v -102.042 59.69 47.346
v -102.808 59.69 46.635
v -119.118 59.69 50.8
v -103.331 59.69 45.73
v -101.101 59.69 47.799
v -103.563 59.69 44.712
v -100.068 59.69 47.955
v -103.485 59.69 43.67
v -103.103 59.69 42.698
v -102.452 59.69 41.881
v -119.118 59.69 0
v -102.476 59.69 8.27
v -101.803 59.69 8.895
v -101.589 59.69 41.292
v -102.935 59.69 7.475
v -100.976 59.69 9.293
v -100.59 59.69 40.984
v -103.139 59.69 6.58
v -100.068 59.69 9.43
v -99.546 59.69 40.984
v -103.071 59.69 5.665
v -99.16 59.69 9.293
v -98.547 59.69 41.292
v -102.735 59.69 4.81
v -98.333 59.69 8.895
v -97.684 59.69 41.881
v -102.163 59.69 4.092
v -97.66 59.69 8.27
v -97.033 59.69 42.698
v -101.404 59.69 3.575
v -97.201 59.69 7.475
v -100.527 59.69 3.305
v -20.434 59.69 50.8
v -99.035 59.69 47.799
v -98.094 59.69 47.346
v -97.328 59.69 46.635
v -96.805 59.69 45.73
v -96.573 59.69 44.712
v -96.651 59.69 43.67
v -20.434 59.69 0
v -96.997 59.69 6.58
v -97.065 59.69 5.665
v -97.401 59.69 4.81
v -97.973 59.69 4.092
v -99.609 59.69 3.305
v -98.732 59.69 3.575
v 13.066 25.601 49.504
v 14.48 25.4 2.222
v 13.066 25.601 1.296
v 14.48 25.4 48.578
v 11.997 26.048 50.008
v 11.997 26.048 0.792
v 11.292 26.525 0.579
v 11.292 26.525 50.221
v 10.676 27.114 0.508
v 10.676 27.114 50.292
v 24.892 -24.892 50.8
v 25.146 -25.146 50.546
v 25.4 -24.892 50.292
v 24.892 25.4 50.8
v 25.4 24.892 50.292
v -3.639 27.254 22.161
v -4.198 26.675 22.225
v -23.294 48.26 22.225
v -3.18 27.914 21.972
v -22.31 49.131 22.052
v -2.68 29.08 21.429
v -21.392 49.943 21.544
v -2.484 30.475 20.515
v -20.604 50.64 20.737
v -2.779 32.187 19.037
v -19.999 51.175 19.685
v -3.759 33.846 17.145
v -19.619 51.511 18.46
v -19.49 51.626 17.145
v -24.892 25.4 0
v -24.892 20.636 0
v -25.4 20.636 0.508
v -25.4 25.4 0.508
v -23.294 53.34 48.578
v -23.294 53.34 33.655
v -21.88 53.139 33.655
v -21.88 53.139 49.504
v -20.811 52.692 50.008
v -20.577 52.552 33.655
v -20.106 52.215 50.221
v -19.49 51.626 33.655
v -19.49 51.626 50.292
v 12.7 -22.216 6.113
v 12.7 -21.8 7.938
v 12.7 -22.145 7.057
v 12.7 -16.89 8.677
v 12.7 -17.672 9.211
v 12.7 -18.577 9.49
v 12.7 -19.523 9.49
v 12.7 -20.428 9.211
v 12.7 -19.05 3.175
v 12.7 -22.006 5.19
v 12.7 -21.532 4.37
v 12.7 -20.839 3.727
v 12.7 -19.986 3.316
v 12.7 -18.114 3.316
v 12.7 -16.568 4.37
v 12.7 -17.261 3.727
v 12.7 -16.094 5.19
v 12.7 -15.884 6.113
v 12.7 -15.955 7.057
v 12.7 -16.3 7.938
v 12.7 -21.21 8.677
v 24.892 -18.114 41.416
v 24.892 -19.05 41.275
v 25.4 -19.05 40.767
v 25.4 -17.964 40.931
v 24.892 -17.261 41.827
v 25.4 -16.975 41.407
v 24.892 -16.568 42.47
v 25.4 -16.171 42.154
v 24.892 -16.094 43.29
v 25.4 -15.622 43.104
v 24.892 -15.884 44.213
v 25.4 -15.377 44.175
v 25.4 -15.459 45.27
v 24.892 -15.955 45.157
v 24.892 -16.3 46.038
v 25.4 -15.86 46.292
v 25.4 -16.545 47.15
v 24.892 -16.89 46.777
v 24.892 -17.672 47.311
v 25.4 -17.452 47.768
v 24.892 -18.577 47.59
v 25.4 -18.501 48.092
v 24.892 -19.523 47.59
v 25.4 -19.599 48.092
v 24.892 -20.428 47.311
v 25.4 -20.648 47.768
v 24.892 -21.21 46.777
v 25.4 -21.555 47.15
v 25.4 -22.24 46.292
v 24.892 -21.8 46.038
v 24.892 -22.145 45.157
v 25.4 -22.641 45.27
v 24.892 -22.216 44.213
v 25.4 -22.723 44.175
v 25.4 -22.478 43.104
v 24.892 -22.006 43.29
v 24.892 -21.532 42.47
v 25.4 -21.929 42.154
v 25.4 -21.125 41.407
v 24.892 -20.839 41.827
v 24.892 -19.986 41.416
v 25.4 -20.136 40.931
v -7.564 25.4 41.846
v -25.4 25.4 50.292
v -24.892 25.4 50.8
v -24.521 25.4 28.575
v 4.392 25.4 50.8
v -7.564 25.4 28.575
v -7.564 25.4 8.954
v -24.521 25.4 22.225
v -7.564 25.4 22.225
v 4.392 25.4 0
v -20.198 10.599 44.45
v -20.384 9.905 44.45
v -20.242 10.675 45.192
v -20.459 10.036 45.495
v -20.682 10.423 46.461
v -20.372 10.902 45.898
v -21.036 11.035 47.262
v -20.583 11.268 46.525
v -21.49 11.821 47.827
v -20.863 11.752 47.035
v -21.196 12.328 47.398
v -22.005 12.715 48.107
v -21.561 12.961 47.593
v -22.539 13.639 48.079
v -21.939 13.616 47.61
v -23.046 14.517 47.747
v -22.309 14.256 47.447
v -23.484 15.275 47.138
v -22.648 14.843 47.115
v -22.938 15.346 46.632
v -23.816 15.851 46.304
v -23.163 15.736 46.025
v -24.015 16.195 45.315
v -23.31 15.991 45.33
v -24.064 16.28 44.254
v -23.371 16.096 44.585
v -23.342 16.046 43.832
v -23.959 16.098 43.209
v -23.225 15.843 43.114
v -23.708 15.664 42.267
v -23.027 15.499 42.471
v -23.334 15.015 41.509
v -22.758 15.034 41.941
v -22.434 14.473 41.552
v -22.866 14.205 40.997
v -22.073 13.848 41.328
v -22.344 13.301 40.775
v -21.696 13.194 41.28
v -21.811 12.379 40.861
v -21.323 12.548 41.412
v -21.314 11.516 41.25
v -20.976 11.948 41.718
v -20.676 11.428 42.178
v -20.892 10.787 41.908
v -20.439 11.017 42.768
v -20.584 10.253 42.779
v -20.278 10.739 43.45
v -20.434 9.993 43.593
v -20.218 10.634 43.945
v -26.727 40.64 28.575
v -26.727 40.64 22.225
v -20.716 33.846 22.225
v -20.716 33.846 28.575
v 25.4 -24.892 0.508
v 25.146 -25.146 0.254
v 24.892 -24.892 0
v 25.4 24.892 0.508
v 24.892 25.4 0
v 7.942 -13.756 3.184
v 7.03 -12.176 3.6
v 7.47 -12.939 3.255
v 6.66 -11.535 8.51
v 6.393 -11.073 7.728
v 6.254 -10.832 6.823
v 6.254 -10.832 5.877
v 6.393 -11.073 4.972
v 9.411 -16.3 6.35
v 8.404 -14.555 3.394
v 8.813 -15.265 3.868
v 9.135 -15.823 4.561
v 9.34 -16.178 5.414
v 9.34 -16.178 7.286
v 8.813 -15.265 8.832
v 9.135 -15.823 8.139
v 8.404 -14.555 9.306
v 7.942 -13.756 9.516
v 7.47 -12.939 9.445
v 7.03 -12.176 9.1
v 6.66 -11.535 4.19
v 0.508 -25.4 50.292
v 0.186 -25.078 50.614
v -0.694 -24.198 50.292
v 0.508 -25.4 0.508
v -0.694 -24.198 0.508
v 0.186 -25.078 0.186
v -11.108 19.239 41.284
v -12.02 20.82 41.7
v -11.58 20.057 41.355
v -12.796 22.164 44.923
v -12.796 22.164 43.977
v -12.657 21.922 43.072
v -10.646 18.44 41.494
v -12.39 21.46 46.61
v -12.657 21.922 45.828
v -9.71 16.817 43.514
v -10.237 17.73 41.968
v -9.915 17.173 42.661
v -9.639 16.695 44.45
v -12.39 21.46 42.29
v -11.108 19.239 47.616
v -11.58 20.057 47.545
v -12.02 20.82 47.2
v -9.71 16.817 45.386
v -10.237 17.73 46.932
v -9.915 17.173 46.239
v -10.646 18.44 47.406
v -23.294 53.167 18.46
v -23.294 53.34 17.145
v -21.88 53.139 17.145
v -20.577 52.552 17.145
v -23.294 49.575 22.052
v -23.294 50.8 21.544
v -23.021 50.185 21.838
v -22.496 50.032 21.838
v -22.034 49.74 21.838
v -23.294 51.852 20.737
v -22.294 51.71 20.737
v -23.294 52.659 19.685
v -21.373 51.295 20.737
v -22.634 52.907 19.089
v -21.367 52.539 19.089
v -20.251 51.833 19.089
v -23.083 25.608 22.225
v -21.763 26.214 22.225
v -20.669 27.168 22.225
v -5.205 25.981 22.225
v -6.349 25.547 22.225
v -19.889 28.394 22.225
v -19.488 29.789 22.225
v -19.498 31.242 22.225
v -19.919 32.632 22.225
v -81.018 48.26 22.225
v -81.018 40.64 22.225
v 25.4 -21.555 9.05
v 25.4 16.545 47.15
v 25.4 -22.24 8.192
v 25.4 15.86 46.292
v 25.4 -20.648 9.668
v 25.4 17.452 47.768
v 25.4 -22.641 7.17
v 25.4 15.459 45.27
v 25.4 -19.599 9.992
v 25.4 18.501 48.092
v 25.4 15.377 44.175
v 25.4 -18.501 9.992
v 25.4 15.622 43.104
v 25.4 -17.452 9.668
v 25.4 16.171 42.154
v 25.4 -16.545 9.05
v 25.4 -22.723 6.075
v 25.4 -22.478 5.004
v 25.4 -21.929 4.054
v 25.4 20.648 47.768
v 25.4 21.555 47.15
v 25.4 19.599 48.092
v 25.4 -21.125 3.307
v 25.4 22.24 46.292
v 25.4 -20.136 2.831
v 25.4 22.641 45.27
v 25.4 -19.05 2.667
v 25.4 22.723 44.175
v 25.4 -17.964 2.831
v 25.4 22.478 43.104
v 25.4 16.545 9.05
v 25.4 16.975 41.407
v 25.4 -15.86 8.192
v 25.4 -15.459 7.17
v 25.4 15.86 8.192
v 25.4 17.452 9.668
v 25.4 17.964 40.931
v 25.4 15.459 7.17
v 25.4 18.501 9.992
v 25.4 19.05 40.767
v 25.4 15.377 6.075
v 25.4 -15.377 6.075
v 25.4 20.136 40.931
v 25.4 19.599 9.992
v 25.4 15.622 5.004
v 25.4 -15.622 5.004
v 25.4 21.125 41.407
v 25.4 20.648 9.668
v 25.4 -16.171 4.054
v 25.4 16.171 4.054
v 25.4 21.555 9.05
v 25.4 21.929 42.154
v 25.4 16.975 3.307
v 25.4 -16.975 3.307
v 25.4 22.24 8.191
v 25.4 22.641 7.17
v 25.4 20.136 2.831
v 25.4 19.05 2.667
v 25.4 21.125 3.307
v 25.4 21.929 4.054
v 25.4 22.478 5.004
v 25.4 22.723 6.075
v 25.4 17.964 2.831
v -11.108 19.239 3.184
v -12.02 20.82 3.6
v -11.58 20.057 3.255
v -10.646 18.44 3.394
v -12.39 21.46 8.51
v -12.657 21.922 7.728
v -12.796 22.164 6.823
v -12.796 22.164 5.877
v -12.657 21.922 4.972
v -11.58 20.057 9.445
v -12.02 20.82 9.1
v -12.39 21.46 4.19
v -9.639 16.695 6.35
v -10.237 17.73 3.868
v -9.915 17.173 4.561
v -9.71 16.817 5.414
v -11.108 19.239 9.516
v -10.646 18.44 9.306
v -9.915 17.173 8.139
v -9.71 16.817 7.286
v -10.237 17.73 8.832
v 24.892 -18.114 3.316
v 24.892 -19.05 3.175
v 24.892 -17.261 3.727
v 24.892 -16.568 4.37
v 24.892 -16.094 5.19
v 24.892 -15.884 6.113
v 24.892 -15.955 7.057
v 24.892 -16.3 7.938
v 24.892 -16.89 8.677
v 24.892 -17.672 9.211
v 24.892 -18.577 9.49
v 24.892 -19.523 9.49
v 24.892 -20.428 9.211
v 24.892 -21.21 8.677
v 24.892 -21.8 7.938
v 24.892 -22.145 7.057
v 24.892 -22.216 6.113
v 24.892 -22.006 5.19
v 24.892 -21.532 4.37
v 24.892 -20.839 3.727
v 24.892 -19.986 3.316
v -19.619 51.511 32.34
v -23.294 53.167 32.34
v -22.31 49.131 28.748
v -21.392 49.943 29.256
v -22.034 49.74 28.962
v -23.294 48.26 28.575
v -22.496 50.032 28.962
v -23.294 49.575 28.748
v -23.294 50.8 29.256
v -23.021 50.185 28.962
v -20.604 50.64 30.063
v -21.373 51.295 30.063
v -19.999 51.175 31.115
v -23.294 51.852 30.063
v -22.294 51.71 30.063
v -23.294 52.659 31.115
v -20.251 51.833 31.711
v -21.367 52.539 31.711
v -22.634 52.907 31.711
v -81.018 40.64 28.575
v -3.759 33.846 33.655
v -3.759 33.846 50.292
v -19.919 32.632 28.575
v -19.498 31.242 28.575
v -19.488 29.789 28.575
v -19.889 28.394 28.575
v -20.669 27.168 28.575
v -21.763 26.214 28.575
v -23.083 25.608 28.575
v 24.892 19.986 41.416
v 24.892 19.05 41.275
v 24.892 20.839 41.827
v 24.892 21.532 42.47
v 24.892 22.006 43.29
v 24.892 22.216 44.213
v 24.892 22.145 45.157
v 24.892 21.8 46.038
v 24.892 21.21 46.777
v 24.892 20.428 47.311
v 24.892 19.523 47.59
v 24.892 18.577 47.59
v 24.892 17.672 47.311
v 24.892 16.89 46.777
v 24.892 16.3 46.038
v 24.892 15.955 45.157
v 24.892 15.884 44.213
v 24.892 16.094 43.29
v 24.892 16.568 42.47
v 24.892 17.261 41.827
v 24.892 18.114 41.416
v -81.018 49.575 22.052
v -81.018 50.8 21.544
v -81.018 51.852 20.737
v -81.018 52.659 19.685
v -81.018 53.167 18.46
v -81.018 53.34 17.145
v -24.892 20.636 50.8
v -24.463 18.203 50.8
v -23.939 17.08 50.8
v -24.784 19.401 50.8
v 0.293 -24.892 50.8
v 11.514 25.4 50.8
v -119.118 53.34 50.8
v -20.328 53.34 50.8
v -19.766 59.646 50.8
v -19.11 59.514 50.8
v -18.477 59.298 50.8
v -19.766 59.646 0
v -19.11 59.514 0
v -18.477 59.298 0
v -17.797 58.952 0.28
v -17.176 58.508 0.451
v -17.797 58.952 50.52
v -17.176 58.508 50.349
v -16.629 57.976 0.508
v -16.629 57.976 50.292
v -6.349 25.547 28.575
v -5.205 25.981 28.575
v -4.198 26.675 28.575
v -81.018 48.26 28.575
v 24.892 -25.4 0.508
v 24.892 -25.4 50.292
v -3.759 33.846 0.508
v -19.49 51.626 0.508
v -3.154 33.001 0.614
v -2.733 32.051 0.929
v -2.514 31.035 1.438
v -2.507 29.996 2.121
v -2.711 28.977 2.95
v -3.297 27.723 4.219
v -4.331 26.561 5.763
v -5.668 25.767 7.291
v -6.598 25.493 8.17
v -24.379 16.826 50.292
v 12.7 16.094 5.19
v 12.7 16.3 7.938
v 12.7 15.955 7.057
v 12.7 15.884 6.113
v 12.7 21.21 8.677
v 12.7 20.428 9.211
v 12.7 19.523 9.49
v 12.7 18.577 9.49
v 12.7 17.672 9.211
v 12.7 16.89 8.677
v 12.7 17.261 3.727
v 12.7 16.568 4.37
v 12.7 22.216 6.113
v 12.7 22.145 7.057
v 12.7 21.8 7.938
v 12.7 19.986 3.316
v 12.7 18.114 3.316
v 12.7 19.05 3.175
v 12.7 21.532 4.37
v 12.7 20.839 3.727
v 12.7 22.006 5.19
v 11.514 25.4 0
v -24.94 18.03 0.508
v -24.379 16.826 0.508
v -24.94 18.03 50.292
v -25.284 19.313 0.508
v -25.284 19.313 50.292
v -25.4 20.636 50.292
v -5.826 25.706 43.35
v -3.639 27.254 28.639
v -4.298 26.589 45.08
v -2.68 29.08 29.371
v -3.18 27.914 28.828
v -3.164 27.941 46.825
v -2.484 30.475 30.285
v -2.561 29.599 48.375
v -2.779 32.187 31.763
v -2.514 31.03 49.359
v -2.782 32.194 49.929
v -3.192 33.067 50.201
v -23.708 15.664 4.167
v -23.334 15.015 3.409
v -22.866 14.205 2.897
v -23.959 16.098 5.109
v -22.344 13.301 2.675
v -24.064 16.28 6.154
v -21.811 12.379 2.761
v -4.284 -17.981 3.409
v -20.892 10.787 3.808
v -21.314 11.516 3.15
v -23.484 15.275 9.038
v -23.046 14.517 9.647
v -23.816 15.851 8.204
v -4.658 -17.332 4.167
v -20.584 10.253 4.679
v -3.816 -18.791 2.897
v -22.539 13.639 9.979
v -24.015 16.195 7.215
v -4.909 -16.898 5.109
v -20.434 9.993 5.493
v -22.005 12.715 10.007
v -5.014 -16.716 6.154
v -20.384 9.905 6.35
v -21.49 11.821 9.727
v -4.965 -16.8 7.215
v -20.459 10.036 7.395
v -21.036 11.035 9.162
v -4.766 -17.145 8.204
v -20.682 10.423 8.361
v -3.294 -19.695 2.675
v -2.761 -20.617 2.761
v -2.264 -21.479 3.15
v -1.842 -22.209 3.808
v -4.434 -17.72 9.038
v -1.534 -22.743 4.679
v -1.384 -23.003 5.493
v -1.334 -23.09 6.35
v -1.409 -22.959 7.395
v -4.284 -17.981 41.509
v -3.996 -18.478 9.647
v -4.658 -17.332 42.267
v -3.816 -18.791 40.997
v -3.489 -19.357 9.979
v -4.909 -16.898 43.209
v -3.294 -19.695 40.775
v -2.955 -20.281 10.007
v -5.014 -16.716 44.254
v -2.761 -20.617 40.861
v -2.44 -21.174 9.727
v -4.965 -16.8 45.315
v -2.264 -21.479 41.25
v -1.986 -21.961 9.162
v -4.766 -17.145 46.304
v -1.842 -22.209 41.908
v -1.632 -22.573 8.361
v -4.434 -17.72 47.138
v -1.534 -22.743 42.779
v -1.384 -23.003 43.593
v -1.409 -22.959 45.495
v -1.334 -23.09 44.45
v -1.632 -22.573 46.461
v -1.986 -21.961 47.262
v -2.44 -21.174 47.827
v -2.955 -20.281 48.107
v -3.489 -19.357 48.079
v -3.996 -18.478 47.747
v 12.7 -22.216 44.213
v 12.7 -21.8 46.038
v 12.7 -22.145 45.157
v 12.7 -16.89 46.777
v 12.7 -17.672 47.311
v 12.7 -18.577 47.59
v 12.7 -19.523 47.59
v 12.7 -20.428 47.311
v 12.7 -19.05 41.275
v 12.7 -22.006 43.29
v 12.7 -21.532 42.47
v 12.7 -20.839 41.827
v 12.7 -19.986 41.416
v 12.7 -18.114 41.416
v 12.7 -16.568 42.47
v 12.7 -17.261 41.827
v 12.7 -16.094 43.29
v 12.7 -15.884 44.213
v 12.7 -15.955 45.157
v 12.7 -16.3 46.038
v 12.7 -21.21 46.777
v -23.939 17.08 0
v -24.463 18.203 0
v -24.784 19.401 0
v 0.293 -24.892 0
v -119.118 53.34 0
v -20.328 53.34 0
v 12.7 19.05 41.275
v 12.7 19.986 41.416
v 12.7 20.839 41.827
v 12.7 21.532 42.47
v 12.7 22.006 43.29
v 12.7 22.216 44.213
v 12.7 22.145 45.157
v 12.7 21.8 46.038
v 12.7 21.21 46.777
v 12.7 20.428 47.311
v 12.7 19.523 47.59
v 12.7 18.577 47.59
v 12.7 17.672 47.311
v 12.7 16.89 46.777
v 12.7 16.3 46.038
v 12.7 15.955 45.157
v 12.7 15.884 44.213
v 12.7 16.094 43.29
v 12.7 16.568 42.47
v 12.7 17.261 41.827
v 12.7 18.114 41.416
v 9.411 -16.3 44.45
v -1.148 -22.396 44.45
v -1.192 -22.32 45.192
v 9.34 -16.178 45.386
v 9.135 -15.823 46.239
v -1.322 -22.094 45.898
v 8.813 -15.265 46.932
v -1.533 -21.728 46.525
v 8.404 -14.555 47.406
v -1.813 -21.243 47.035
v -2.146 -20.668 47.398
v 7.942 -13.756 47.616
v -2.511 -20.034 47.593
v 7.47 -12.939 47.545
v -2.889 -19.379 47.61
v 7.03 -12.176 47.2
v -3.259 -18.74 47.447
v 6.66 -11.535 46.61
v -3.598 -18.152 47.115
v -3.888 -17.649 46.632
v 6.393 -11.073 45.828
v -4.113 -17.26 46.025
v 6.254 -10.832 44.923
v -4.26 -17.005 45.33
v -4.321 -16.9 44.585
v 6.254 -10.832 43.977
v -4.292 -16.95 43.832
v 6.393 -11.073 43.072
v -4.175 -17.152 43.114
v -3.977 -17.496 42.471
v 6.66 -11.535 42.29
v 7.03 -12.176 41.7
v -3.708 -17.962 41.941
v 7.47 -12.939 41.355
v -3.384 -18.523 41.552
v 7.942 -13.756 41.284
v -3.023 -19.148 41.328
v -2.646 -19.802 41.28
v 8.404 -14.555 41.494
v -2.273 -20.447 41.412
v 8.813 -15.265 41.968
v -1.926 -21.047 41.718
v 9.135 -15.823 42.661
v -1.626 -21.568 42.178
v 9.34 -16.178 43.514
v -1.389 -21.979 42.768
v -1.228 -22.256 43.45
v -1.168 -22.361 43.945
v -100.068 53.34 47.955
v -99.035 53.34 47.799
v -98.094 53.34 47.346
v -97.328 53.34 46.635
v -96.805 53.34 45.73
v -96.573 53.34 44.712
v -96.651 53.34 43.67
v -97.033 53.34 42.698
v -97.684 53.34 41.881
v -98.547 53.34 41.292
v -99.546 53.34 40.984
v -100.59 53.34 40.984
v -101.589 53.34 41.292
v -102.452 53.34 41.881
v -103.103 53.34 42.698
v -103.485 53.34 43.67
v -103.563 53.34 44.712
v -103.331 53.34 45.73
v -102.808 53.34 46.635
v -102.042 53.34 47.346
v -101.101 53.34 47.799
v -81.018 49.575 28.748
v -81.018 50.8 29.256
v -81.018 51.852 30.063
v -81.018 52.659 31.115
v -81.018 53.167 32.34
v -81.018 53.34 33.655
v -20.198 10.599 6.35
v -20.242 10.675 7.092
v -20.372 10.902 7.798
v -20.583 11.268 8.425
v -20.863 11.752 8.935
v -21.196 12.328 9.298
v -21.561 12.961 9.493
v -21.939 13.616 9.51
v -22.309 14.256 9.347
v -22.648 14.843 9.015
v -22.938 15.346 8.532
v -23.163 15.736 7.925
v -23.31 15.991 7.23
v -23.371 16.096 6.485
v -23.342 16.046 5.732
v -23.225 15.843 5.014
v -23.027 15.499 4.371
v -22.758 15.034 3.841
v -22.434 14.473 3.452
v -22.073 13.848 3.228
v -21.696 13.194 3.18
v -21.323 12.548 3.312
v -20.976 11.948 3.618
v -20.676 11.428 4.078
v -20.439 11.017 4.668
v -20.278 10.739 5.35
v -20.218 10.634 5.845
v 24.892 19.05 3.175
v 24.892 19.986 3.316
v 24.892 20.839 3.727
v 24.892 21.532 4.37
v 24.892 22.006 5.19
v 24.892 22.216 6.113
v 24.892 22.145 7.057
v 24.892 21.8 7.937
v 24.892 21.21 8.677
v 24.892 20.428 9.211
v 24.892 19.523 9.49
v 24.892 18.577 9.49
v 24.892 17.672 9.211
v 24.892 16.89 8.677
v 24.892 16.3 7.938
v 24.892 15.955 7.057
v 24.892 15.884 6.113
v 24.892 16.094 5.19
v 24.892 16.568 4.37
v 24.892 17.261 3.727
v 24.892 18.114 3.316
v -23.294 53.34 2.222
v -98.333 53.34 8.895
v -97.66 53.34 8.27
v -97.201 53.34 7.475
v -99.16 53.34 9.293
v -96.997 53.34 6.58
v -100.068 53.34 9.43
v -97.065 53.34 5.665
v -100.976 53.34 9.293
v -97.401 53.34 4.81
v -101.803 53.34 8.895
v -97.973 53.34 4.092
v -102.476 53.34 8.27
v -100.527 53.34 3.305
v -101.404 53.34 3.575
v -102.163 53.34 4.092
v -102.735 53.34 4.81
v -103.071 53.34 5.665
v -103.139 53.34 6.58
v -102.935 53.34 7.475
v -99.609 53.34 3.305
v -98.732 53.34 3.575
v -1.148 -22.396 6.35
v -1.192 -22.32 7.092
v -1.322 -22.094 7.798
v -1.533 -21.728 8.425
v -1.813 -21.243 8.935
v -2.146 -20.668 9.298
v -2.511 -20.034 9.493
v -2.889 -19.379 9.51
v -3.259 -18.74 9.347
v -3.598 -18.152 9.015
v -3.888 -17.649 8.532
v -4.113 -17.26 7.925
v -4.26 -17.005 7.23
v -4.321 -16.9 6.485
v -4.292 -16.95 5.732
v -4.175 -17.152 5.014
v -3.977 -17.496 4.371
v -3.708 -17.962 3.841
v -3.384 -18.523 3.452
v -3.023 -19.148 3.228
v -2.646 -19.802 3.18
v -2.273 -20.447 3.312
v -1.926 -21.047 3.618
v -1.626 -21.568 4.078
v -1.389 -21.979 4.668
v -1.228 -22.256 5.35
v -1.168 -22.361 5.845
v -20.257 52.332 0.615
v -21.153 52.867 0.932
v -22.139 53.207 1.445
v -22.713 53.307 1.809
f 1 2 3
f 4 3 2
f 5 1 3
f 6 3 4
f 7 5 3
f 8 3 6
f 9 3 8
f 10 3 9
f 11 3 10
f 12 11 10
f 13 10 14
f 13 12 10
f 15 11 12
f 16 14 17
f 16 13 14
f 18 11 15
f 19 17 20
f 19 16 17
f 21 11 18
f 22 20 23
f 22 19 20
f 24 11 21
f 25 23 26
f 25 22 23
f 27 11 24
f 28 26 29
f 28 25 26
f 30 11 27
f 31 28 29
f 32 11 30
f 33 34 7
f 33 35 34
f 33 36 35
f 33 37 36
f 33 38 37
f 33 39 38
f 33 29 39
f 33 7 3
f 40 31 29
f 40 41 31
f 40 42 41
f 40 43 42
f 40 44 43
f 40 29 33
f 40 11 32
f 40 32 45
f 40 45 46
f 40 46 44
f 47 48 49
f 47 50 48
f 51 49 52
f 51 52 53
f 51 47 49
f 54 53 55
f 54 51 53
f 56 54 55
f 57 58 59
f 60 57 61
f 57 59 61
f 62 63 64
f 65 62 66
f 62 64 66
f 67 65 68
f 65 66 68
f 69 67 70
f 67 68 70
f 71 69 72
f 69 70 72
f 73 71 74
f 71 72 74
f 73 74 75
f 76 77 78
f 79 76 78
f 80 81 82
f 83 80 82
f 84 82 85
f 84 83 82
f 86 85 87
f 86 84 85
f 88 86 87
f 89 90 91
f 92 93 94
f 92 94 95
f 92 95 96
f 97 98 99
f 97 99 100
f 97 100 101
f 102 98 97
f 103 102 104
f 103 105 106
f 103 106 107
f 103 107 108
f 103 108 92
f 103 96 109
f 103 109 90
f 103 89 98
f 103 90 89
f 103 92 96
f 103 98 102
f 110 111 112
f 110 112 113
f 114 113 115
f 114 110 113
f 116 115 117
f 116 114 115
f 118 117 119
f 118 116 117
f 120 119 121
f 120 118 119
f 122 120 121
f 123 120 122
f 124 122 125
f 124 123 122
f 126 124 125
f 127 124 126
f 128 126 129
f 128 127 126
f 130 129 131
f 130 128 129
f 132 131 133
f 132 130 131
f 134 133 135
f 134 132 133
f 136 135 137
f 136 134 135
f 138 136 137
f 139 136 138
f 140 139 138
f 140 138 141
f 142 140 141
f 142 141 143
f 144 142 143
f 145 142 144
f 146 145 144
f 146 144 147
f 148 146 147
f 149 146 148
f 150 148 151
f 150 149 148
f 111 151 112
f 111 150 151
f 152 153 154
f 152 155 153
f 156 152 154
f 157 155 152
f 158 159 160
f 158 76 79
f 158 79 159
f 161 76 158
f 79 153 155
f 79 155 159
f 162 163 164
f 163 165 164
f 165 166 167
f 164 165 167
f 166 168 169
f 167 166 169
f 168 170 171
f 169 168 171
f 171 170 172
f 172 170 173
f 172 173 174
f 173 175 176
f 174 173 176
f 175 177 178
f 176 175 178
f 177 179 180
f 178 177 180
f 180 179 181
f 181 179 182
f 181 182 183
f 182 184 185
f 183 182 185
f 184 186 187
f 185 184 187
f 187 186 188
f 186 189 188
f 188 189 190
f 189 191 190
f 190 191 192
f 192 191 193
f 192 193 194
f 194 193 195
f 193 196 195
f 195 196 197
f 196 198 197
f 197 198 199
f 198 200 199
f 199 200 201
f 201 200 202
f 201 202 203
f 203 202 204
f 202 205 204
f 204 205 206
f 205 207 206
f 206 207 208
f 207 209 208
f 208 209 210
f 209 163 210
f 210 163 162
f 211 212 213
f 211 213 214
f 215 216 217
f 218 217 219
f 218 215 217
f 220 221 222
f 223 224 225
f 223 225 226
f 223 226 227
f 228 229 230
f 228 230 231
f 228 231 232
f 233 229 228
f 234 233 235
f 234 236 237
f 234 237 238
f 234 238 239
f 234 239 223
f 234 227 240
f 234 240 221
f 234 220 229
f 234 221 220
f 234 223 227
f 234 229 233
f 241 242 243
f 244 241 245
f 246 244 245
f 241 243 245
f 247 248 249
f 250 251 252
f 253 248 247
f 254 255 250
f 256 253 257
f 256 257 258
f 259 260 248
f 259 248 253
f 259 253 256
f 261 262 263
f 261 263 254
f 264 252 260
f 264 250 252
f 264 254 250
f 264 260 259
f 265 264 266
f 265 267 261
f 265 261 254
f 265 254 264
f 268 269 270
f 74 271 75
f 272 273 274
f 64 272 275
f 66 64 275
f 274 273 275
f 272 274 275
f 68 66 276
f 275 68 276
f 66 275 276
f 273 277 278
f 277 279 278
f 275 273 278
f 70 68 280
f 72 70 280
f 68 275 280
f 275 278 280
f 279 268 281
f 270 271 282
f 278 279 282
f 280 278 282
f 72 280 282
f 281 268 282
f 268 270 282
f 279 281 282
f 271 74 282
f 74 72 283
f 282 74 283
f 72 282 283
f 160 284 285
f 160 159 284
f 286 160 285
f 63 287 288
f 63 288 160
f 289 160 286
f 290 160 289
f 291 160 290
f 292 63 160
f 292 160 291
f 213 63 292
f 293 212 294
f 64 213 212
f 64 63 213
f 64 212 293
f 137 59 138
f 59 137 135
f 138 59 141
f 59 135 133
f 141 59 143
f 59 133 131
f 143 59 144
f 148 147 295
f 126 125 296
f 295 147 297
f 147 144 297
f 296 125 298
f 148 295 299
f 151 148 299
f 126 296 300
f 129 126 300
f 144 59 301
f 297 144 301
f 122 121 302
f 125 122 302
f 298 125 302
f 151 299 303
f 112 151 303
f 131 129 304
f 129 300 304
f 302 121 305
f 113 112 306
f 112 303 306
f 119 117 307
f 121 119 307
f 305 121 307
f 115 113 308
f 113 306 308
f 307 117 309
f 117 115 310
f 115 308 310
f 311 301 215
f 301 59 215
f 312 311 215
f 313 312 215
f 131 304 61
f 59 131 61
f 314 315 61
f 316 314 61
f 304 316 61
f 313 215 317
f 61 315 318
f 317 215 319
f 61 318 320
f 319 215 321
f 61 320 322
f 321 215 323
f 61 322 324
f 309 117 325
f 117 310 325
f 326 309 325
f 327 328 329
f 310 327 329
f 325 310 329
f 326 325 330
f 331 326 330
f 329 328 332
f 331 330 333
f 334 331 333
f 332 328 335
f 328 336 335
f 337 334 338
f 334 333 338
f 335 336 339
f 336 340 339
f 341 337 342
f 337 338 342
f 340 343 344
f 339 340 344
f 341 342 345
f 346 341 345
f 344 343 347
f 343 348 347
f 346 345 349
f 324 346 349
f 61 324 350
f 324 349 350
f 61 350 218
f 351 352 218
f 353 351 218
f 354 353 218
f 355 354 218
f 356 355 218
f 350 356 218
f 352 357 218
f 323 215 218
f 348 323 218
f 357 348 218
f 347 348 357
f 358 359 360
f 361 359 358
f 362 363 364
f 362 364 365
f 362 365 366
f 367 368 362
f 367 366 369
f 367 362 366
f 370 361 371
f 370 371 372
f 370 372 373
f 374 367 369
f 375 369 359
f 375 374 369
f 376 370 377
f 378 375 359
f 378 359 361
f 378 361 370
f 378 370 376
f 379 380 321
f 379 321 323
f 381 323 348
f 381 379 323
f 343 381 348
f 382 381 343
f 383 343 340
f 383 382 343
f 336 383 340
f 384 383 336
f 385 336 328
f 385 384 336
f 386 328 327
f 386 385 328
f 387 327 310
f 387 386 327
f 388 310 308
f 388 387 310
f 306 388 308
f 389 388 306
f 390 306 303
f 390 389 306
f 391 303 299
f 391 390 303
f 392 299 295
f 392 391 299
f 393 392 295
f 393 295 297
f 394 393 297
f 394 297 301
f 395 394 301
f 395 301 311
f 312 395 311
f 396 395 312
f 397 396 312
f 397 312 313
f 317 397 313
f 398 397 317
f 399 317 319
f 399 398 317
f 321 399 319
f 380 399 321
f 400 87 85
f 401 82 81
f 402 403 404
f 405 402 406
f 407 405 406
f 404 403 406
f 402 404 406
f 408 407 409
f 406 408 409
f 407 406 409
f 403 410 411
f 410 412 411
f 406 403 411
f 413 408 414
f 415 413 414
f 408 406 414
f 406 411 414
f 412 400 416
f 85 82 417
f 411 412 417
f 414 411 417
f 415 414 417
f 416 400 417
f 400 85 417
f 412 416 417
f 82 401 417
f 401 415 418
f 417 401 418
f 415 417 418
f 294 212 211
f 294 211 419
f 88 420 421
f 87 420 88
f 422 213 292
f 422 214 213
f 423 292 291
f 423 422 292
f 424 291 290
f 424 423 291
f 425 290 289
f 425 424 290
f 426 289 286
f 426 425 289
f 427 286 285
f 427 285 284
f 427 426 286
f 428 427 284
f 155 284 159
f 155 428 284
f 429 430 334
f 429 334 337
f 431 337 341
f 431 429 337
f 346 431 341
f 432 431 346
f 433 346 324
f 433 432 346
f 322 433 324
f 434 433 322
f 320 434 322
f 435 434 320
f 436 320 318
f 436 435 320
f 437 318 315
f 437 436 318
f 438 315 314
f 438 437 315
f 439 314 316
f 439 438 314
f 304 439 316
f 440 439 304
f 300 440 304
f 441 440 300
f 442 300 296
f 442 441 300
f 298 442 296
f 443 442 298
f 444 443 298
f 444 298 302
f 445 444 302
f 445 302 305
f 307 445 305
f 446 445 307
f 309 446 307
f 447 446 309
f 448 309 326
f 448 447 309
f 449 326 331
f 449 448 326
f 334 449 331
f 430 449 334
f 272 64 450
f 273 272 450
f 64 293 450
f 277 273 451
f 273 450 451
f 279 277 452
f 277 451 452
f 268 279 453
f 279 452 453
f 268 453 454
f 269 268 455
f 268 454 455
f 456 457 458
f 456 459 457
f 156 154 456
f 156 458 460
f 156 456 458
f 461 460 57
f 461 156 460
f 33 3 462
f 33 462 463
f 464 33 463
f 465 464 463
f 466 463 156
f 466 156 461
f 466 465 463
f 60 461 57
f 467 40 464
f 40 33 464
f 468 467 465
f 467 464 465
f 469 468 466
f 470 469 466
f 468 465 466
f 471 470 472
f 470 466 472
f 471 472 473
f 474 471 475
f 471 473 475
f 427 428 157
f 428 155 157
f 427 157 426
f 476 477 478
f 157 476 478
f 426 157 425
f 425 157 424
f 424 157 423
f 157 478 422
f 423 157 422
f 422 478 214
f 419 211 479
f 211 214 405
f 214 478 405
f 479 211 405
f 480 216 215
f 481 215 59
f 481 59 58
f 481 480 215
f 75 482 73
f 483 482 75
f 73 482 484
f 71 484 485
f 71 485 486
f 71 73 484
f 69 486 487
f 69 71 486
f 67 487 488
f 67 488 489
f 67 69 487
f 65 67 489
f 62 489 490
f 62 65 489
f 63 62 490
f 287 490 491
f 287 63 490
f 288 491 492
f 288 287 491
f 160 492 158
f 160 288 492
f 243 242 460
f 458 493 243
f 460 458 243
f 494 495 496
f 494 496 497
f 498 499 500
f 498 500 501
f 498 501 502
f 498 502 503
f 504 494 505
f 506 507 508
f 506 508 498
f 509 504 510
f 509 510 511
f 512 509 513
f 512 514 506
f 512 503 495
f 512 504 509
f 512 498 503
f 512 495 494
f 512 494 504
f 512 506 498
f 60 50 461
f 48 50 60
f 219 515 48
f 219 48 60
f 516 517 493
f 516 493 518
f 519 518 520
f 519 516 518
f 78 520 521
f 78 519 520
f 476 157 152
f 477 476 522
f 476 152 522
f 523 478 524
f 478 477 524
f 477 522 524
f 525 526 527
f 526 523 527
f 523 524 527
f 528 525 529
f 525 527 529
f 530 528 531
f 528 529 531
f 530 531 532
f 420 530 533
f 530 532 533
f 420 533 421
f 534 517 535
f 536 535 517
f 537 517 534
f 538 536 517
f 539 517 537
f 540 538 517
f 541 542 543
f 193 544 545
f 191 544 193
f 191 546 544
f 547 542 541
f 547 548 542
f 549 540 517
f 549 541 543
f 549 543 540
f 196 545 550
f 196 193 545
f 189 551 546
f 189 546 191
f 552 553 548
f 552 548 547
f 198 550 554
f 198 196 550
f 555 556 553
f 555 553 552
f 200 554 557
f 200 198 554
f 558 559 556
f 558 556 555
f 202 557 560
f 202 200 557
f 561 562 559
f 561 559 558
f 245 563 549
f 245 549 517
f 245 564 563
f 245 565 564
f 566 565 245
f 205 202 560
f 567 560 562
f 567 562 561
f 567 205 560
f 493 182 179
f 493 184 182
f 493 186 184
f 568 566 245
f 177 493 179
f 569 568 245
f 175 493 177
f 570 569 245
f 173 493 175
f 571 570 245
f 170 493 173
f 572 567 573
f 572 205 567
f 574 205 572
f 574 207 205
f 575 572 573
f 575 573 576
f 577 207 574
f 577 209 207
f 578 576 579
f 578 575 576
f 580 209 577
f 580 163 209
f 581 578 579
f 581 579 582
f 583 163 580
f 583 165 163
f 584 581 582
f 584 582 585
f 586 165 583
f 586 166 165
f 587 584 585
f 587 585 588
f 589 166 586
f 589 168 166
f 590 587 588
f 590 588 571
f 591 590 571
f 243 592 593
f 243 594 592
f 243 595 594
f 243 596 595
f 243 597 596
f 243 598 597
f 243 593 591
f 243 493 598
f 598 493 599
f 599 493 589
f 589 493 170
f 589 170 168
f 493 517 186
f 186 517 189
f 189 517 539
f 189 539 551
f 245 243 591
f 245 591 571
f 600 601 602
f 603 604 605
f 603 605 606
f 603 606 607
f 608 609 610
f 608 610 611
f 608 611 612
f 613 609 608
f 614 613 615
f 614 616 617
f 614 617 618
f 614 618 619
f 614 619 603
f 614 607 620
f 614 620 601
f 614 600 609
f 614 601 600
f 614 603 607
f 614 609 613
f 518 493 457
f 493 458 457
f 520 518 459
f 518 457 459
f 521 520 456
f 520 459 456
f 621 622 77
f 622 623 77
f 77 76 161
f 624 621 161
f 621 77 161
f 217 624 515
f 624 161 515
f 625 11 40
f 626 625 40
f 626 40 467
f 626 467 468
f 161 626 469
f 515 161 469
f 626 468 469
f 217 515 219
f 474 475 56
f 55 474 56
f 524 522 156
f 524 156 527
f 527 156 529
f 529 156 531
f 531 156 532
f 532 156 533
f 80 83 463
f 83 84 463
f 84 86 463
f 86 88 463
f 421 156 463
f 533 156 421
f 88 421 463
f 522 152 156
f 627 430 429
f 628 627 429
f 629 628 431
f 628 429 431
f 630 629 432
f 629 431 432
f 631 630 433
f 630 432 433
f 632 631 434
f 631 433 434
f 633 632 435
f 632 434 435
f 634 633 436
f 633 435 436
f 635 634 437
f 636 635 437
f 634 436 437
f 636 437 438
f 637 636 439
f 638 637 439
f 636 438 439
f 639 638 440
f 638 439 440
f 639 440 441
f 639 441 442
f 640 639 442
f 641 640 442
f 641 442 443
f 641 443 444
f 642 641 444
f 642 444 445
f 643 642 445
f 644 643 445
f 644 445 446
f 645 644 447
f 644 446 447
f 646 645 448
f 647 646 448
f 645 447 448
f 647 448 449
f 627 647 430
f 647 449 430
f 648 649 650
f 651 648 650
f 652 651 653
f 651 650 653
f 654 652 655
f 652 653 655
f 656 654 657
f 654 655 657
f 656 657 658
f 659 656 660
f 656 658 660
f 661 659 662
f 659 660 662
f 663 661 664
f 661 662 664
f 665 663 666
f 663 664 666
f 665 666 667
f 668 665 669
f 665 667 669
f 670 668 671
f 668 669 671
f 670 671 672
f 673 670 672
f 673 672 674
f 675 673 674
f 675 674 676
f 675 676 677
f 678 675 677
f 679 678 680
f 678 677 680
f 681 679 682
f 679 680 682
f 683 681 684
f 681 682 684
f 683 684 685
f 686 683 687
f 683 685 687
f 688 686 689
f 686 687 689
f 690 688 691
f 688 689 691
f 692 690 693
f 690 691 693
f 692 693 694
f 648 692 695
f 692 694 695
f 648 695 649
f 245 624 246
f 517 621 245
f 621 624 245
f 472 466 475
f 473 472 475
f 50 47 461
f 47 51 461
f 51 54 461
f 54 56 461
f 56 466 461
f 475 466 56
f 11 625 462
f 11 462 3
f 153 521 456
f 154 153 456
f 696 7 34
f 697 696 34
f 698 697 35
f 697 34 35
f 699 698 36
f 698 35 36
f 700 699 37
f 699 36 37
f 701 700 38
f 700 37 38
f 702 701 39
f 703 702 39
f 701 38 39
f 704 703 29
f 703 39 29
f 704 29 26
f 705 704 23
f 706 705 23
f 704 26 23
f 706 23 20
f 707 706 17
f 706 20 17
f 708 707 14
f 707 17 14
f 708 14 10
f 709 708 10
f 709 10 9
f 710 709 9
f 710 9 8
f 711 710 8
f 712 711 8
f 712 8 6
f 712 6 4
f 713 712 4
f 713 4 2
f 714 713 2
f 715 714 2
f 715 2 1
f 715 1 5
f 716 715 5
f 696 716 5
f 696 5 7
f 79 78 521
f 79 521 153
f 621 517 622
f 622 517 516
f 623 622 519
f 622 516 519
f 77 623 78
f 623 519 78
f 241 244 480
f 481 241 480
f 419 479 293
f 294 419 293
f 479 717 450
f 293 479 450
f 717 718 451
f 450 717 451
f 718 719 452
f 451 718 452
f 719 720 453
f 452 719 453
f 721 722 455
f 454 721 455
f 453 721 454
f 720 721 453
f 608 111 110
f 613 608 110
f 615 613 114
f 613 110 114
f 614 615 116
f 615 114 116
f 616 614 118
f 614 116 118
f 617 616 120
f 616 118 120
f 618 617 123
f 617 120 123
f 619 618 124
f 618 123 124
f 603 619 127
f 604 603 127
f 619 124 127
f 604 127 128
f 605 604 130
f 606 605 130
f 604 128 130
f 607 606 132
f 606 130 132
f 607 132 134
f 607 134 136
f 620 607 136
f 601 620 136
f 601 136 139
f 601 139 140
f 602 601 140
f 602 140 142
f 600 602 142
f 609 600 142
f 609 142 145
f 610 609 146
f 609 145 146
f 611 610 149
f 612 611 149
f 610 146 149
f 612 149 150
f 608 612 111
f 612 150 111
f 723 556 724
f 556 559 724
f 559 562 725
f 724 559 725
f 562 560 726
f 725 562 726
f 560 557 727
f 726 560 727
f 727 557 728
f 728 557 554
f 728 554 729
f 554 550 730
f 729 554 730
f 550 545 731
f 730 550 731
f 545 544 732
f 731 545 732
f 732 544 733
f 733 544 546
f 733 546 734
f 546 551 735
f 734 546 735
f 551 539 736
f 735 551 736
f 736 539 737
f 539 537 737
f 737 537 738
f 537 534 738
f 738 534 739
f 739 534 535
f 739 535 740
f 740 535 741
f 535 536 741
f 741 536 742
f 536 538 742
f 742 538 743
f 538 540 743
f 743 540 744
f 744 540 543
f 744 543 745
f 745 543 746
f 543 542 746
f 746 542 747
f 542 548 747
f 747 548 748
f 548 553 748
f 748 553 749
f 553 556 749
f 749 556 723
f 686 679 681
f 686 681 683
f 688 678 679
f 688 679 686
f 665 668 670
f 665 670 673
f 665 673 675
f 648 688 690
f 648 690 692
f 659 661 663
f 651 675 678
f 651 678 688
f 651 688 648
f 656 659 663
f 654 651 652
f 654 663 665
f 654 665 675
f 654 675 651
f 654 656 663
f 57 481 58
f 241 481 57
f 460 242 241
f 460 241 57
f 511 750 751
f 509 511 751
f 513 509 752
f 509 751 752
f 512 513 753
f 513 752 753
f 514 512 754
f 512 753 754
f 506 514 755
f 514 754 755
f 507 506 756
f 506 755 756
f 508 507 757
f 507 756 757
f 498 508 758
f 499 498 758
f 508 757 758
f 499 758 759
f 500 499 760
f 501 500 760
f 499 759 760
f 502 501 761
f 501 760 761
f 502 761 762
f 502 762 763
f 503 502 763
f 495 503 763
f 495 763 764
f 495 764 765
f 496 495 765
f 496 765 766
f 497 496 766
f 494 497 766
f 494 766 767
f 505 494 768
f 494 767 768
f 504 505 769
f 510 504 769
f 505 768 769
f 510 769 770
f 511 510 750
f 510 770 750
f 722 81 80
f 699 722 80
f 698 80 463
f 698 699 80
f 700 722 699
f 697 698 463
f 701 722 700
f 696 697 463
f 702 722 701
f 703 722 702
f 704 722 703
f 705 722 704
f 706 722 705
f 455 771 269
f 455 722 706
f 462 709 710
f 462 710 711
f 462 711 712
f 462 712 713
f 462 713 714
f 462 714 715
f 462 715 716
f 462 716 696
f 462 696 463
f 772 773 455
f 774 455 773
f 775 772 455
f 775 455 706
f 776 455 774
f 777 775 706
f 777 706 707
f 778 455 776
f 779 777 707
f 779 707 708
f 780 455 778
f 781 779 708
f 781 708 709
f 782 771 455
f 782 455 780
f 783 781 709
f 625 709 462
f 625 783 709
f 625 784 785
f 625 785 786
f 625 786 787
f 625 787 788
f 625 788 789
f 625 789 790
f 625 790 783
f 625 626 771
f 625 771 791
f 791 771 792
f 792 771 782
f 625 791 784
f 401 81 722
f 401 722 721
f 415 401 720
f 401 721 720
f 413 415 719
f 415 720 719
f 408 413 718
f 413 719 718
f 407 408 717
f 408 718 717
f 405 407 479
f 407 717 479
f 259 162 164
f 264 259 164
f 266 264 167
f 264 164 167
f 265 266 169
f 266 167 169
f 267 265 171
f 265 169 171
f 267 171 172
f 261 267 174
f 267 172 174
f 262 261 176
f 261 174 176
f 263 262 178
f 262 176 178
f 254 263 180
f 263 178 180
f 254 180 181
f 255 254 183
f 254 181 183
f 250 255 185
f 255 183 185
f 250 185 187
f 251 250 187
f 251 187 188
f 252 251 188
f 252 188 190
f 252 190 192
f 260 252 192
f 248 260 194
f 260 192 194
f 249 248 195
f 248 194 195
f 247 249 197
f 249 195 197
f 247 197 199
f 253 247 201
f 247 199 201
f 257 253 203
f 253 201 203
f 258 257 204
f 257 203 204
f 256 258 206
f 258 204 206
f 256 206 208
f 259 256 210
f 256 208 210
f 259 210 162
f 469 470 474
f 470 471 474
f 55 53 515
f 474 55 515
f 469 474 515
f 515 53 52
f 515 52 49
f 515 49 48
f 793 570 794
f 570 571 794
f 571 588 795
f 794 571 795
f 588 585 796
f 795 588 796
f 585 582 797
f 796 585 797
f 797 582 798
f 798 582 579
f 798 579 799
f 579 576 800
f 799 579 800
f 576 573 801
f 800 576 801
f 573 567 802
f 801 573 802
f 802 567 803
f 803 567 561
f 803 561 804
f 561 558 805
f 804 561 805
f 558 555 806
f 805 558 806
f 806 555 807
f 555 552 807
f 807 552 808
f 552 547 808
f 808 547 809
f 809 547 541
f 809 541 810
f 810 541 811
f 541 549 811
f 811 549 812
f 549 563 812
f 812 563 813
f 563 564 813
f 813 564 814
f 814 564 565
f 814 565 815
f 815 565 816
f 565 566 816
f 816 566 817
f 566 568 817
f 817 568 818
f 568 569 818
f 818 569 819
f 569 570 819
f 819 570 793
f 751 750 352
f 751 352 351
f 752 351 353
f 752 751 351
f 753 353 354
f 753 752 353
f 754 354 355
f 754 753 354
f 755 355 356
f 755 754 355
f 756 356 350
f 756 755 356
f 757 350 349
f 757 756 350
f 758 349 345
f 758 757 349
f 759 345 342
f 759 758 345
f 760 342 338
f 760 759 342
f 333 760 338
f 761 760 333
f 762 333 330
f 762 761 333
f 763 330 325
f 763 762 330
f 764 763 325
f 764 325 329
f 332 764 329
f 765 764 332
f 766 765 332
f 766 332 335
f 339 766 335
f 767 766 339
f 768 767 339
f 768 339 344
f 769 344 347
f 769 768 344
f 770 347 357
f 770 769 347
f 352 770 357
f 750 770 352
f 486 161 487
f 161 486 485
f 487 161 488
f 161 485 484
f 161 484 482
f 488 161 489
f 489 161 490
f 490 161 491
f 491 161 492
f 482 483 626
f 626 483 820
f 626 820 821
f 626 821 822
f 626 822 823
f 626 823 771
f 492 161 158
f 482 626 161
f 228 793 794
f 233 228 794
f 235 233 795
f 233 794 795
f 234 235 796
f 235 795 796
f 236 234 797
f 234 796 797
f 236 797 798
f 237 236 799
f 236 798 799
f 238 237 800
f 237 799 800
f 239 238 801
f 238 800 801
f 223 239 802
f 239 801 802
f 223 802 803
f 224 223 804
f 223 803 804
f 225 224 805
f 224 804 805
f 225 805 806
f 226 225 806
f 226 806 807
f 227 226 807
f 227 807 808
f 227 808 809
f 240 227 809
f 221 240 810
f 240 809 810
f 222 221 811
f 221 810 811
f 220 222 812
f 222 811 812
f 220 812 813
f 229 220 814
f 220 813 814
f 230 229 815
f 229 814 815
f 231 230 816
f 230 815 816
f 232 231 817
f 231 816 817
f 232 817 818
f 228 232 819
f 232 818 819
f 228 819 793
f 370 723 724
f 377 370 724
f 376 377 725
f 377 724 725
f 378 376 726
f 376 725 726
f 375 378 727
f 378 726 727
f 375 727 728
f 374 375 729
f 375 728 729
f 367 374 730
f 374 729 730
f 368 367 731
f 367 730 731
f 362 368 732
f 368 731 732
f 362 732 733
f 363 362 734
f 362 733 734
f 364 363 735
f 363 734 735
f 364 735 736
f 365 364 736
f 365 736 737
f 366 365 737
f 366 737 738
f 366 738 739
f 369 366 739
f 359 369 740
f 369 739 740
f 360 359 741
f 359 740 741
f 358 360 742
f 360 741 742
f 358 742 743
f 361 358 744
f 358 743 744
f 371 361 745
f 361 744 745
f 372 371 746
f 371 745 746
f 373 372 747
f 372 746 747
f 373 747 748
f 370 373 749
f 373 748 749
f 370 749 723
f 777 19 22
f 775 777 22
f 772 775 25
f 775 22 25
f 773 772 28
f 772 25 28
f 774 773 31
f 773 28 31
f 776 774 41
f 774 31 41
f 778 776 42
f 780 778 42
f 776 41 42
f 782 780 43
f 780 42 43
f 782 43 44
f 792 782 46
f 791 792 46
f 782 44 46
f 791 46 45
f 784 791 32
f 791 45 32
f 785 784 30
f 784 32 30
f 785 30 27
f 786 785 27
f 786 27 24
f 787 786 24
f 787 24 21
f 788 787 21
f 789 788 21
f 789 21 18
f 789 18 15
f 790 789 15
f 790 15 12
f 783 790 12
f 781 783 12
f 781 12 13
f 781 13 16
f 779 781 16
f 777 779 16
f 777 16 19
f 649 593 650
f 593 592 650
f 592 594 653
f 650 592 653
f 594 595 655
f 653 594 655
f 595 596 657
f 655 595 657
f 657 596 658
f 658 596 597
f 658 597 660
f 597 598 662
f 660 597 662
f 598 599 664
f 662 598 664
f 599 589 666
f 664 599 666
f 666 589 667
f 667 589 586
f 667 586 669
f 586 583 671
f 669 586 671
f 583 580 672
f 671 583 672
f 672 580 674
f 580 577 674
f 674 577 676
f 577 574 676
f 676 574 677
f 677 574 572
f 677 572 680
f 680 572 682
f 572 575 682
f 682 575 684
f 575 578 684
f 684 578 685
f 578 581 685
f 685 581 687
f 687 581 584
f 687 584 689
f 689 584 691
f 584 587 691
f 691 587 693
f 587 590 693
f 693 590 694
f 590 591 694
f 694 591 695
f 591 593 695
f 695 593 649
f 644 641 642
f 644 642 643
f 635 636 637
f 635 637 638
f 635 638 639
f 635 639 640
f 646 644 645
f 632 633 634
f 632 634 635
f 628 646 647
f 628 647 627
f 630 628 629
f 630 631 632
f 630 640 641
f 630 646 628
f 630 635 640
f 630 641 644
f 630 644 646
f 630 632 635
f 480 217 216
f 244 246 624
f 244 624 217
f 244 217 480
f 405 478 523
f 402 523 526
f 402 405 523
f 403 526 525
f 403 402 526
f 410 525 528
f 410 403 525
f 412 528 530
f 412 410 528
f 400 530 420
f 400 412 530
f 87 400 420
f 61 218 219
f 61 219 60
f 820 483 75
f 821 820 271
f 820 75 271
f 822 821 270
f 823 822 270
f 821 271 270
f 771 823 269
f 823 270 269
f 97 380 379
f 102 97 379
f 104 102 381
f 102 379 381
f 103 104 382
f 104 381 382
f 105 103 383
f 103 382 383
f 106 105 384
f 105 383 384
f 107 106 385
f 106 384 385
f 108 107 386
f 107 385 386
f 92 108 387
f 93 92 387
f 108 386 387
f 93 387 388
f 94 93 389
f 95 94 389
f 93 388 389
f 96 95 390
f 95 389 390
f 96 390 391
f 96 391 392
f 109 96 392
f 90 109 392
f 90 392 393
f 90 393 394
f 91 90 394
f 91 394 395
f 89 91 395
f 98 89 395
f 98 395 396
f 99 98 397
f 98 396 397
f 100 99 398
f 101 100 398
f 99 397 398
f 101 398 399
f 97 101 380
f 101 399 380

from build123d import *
from OCP.BRepFilletAPI import BRepFilletAPI_MakeChamfer

# Parameters (mm, degrees)
SKETCH1_W           = 50.8
SKETCH1_H           = 50.8
BOSS_EXTRUDE1_DEPTH = 50.8
CUT_EXTRUDE1_DEPTH  = 50.8
SKETCH4_R           = 3.175
CUT_EXTRUDE2_DEPTH  = 12.7
SKETCH5_R           = 3.175
CUT_EXTRUDE3_DEPTH  = 12.7
CHAMFER1_SIZE       = 0.508
CHAMFER3_SIZE       = 0.508
CHAMFER3_SIZE2      = 1.38788181
FILLET3_R           = 7.62
BOSS_EXTRUDE2_DEPTH = 50.8
CHAMFER4_SIZE       = 0.508
CHAMFER5_SIZE       = 0.508
SKETCH7_R           = 3.079866406
SKETCH7_R_2         = 3.504854353
CUT_EXTRUDE4_DEPTH  = 19.05
SKETCH9_W           = 60.012063762
SKETCH9_H           = 6.35
BOSS_EXTRUDE4_DEPTH = 12.7
SKETCH10_W          = 6.35
SKETCH10_H          = 37.305371191
BOSS_EXTRUDE5_DEPTH = 12.7
FILLET6_R           = 5.08


with BuildPart() as part:
    # Sketch1 → Boss-Extrude1 (new body)
    with BuildSketch(Plane.XY):
        Rectangle(SKETCH1_W, SKETCH1_H)
    extrude(amount=BOSS_EXTRUDE1_DEPTH)

    # Sketch2 → Cut-Extrude1 (cut)
    with BuildSketch(Plane.XY.offset(50.8)):
        Polygon((-25.4, 18.594090512), (0, -25.4), (-25.4, -25.4), align=None)
    extrude(amount=-CUT_EXTRUDE1_DEPTH, mode=Mode.SUBTRACT)

    # Sketch4 → Cut-Extrude2 (cut)
    with BuildSketch(Plane(origin=(25.4, 0, 0), x_dir=(0, 0, -1), z_dir=(1, 0, 0))):
        with Locations((-44.45, 19.05)):
            Circle(SKETCH4_R)
        with Locations((-6.35, 19.05)):
            Circle(SKETCH4_R)
        with Locations((-6.35, -19.05)):
            Circle(SKETCH4_R)
        with Locations((-44.45, -19.05)):
            Circle(SKETCH4_R)
    extrude(amount=-CUT_EXTRUDE2_DEPTH, mode=Mode.SUBTRACT)

    # Sketch5 → Cut-Extrude3 (cut)
    with BuildSketch(Plane(origin=(-10.998522628, -6.35, 0), x_dir=(0, 0, 1), z_dir=(-0.8660254037844364, -0.5000000000000041, 0))):
        with Locations(Location((6.35, 22.452954744, 0), (0, 0, 270))):
            Circle(SKETCH5_R)
        with Locations(Location((44.45, 22.452954744, 0), (0, 0, 270))):
            Circle(SKETCH5_R)
        with Locations(Location((44.45, -15.647045256, 0), (0, 0, 270))):
            Circle(SKETCH5_R)
        with Locations(Location((6.35, -15.647045256, 0), (0, 0, 270))):
            Circle(SKETCH5_R)
    extrude(amount=-CUT_EXTRUDE3_DEPTH, mode=Mode.SUBTRACT)

    # Chamfer1
    chamfer1_edges = [part.edges().sort_by_distance(p)[0] for p in [
        (25.4, -19.05, 47.625),
        (25.4, -19.05, 9.525),
        (25.4, 19.05, 9.525),
        (25.4, 19.05, 47.625),
        (25.4, 0, 50.8),
        (25.4, 0, 0),
        (25.4, -25.4, 25.4),
        (25.4, 25.4, 25.4),
    ]]
    chamfer(chamfer1_edges, length=CHAMFER1_SIZE)

    # Chamfer3: one chamfer whose edges measure the first distance from different faces: ONE call of the kernel's chamfer builder (chamfer() names one face for all edges)
    chamfer3_edges_1 = [part.edges().sort_by_distance(p)[0] for p in [
        (0, -25.4, 25.4),
    ]]
    chamfer3_side_1 = [part.faces().sort_by_distance(p)[0] for p in [
        (12.446, -25.4, 25.4),
    ]]
    chamfer3_edges_2 = [part.edges().sort_by_distance(p)[0] for p in [
        (-4.7625, -17.151108029, 6.35),
        (-4.7625, -17.151108029, 44.45),
        (-23.8125, 15.844459855, 44.45),
        (-23.8125, 15.844459855, 6.35),
    ]]
    chamfer3 = BRepFilletAPI_MakeChamfer(part.part.solid().wrapped)
    for e in chamfer3_edges_1:
        chamfer3.Add(CHAMFER3_SIZE, CHAMFER3_SIZE2, e.wrapped, chamfer3_side_1[0].wrapped)  # the first distance lies on this face
    for e in chamfer3_edges_2:
        chamfer3.Add(CHAMFER3_SIZE, e.wrapped)
    add(Compound.cast(chamfer3.Shape()), mode=Mode.REPLACE)

    # Fillet3
    fillet3_edges = [part.edges().sort_by_distance(p)[0] for p in [
        (-25.4, 18.594090512, 25.4),
    ]]
    fillet(fillet3_edges, radius=FILLET3_R)

    # Sketch6 → Boss-Extrude2 (add, through all)
    with BuildSketch(Plane(origin=(0, 0, 0), x_dir=(-1, 0, 0), z_dir=(0, 0, -1))):
        Polygon((18.145405324, 59.69), (-12.192, 25.4), (-3.713506547, 25.4), (21.005860753, 53.34), (119.117924515, 53.34), (119.117924515, 59.69), align=None)
    extrude(amount=-BOSS_EXTRUDE2_DEPTH)

    # Chamfer4
    # the kernel refuses this chamfer: 0.508 mm, written as the material it takes off along each edge
    with BuildSketch(Plane(origin=(-0.798414958, -25.4, 0), x_dir=(0, 0.9996219169112968, -0.027495876610586417), z_dir=(1, 0, 0)), Plane(origin=(-0.798414958, -25.4, 50.8), x_dir=(0, -0.027495876610587118, -0.9996219169112968), z_dir=(1, 0, 0))) as chamfer4_piece_1:
        Polygon((CHAMFER4_SIZE * 0.999621916911, CHAMFER4_SIZE * 0.0274958766106), (-CHAMFER4_SIZE * 0.0274958766106, CHAMFER4_SIZE * 0.999621916911), (0, 0), align=None)
    extrude(amount=26.996829916, mode=Mode.SUBTRACT)
    with BuildSketch(Plane(origin=(-25.4, 26.706414958, 50.8), x_dir=(-0.027495876610587118, 0, -0.9996219169112968), z_dir=(0, -1, 0)), Plane(origin=(-25.4, 26.706414958, 0), x_dir=(0.9996219169112968, 0, -0.027495876610586417), z_dir=(0, -1, 0))) as chamfer4_piece_2:
        Polygon((CHAMFER4_SIZE * 0.999621916911, CHAMFER4_SIZE * 0.0274958766106), (-CHAMFER4_SIZE * 0.0274958766106, CHAMFER4_SIZE * 0.999621916911), (0, 0), align=None)
    extrude(amount=6.070551599, mode=Mode.SUBTRACT)
    with BuildSketch(Plane(origin=(-17.78, 20.635863359, 50.8), x_dir=(-0.8660254037844363, -0.5000000000000041, 0), z_dir=(0.5000000000000041, -0.8660254037844363, 0))) as chamfer4_piece_3:
        Polygon((7.62, CHAMFER4_SIZE), (7.62 - CHAMFER4_SIZE, 0), (7.62, 0), align=None)
    revolve(axis=Axis((-17.78, 20.635863359, 50.8), (0, 0, -1)), revolution_arc=30, mode=Mode.SUBTRACT)
    with BuildSketch(Plane(origin=(-24.379113577, 16.825863359, 50.8), x_dir=(-0.023812127644096983, -0.013747938305297273, -0.9996219169112965), z_dir=(0.5000000000000041, -0.8660254037844363, 0)), Plane(origin=(-24.379113577, 16.825863359, 0), x_dir=(0.8656979742248779, 0.4998109584556525, -0.027495876610586285), z_dir=(0.5000000000000041, -0.8660254037844363, 0))) as chamfer4_piece_4:
        Polygon((CHAMFER4_SIZE * 0.999621916911, CHAMFER4_SIZE * 0.0274958766106), (-CHAMFER4_SIZE * 0.0274958766106, CHAMFER4_SIZE * 0.999621916911), (0, 0), align=None)
    extrude(amount=48.676760301, mode=Mode.SUBTRACT)
    with BuildSketch(Plane(origin=(-17.78, 20.635863359, 0), x_dir=(-0.8660254037844363, -0.5000000000000041, 0), z_dir=(0.5000000000000041, -0.8660254037844363, 0))) as chamfer4_piece_5:
        Polygon((7.62 - CHAMFER4_SIZE, 0), (7.62, -CHAMFER4_SIZE), (7.62, 0), align=None)
    revolve(axis=Axis((-17.78, 20.635863359, 0), (0, 0, -1)), revolution_arc=30, mode=Mode.SUBTRACT)

    # Chamfer5
    chamfer5_edges = [part.edges().sort_by_distance(p)[0] for p in [
        (-8.646177103, 39.37, 0),
        (-2.976702662, 42.545, 0),
        (-8.646177103, 39.37, 50.8),
        (-2.976702662, 42.545, 50.8),
    ]]
    chamfer(chamfer5_edges, length=CHAMFER5_SIZE)

    # Sketch7 → Cut-Extrude4 (cut)
    with BuildSketch(Plane(origin=(0, 59.69, 0), x_dir=(1, 0, 0), z_dir=(0, 1, 0))):
        with Locations(Location((-100.067924515, -6.35, 0), (0, 0, 270))):
            Circle(SKETCH7_R)
        with Locations(Location((-100.067924515, -44.45, 0), (0, 0, 270))):
            Circle(SKETCH7_R_2)
    extrude(amount=-CUT_EXTRUDE4_DEPTH, mode=Mode.SUBTRACT)

    # Sketch9 → Boss-Extrude4 (add)
    with BuildSketch(Plane(origin=(0, 53.34, 0), x_dir=(-1, 0, 0), z_dir=(0, -1, 0))):
        with Locations((51.011892634, -25.4)):
            Rectangle(SKETCH9_W, SKETCH9_H)
    extrude(amount=BOSS_EXTRUDE4_DEPTH)

    # Sketch10 → Boss-Extrude5 (add)
    with BuildSketch(Plane(origin=(14.688369002, 12.995246543, 0), x_dir=(0, 0, 1), z_dir=(-0.7489538130165907, -0.6626222045539297, 0))):
        with Locations((25.4, 35.215460552)):
            Rectangle(SKETCH10_W, SKETCH10_H)
    extrude(amount=BOSS_EXTRUDE5_DEPTH)

    # Fillet6
    fillet6_edges = [part.edges().sort_by_distance(p)[0] for p in [
        (-51.011892634, 53.34, 22.225),
        (-8.646177103, 39.37, 22.225),
        (-8.646177103, 39.37, 28.575),
        (-51.011892634, 53.34, 28.575),
        (-13.243480358, 25.4, 25.4),
        (3.713506547, 25.4, 39.4335),
        (3.713506547, 25.4, 11.3665),
        (-21.005860753, 53.34, 39.4335),
        (-21.005860753, 53.34, 11.3665),
        (-18.145405324, 59.69, 25.4),
        (12.192, 25.4, 25.4),
    ]]
    fillet(fillet6_edges, radius=FILLET6_R)


solid = part.part
